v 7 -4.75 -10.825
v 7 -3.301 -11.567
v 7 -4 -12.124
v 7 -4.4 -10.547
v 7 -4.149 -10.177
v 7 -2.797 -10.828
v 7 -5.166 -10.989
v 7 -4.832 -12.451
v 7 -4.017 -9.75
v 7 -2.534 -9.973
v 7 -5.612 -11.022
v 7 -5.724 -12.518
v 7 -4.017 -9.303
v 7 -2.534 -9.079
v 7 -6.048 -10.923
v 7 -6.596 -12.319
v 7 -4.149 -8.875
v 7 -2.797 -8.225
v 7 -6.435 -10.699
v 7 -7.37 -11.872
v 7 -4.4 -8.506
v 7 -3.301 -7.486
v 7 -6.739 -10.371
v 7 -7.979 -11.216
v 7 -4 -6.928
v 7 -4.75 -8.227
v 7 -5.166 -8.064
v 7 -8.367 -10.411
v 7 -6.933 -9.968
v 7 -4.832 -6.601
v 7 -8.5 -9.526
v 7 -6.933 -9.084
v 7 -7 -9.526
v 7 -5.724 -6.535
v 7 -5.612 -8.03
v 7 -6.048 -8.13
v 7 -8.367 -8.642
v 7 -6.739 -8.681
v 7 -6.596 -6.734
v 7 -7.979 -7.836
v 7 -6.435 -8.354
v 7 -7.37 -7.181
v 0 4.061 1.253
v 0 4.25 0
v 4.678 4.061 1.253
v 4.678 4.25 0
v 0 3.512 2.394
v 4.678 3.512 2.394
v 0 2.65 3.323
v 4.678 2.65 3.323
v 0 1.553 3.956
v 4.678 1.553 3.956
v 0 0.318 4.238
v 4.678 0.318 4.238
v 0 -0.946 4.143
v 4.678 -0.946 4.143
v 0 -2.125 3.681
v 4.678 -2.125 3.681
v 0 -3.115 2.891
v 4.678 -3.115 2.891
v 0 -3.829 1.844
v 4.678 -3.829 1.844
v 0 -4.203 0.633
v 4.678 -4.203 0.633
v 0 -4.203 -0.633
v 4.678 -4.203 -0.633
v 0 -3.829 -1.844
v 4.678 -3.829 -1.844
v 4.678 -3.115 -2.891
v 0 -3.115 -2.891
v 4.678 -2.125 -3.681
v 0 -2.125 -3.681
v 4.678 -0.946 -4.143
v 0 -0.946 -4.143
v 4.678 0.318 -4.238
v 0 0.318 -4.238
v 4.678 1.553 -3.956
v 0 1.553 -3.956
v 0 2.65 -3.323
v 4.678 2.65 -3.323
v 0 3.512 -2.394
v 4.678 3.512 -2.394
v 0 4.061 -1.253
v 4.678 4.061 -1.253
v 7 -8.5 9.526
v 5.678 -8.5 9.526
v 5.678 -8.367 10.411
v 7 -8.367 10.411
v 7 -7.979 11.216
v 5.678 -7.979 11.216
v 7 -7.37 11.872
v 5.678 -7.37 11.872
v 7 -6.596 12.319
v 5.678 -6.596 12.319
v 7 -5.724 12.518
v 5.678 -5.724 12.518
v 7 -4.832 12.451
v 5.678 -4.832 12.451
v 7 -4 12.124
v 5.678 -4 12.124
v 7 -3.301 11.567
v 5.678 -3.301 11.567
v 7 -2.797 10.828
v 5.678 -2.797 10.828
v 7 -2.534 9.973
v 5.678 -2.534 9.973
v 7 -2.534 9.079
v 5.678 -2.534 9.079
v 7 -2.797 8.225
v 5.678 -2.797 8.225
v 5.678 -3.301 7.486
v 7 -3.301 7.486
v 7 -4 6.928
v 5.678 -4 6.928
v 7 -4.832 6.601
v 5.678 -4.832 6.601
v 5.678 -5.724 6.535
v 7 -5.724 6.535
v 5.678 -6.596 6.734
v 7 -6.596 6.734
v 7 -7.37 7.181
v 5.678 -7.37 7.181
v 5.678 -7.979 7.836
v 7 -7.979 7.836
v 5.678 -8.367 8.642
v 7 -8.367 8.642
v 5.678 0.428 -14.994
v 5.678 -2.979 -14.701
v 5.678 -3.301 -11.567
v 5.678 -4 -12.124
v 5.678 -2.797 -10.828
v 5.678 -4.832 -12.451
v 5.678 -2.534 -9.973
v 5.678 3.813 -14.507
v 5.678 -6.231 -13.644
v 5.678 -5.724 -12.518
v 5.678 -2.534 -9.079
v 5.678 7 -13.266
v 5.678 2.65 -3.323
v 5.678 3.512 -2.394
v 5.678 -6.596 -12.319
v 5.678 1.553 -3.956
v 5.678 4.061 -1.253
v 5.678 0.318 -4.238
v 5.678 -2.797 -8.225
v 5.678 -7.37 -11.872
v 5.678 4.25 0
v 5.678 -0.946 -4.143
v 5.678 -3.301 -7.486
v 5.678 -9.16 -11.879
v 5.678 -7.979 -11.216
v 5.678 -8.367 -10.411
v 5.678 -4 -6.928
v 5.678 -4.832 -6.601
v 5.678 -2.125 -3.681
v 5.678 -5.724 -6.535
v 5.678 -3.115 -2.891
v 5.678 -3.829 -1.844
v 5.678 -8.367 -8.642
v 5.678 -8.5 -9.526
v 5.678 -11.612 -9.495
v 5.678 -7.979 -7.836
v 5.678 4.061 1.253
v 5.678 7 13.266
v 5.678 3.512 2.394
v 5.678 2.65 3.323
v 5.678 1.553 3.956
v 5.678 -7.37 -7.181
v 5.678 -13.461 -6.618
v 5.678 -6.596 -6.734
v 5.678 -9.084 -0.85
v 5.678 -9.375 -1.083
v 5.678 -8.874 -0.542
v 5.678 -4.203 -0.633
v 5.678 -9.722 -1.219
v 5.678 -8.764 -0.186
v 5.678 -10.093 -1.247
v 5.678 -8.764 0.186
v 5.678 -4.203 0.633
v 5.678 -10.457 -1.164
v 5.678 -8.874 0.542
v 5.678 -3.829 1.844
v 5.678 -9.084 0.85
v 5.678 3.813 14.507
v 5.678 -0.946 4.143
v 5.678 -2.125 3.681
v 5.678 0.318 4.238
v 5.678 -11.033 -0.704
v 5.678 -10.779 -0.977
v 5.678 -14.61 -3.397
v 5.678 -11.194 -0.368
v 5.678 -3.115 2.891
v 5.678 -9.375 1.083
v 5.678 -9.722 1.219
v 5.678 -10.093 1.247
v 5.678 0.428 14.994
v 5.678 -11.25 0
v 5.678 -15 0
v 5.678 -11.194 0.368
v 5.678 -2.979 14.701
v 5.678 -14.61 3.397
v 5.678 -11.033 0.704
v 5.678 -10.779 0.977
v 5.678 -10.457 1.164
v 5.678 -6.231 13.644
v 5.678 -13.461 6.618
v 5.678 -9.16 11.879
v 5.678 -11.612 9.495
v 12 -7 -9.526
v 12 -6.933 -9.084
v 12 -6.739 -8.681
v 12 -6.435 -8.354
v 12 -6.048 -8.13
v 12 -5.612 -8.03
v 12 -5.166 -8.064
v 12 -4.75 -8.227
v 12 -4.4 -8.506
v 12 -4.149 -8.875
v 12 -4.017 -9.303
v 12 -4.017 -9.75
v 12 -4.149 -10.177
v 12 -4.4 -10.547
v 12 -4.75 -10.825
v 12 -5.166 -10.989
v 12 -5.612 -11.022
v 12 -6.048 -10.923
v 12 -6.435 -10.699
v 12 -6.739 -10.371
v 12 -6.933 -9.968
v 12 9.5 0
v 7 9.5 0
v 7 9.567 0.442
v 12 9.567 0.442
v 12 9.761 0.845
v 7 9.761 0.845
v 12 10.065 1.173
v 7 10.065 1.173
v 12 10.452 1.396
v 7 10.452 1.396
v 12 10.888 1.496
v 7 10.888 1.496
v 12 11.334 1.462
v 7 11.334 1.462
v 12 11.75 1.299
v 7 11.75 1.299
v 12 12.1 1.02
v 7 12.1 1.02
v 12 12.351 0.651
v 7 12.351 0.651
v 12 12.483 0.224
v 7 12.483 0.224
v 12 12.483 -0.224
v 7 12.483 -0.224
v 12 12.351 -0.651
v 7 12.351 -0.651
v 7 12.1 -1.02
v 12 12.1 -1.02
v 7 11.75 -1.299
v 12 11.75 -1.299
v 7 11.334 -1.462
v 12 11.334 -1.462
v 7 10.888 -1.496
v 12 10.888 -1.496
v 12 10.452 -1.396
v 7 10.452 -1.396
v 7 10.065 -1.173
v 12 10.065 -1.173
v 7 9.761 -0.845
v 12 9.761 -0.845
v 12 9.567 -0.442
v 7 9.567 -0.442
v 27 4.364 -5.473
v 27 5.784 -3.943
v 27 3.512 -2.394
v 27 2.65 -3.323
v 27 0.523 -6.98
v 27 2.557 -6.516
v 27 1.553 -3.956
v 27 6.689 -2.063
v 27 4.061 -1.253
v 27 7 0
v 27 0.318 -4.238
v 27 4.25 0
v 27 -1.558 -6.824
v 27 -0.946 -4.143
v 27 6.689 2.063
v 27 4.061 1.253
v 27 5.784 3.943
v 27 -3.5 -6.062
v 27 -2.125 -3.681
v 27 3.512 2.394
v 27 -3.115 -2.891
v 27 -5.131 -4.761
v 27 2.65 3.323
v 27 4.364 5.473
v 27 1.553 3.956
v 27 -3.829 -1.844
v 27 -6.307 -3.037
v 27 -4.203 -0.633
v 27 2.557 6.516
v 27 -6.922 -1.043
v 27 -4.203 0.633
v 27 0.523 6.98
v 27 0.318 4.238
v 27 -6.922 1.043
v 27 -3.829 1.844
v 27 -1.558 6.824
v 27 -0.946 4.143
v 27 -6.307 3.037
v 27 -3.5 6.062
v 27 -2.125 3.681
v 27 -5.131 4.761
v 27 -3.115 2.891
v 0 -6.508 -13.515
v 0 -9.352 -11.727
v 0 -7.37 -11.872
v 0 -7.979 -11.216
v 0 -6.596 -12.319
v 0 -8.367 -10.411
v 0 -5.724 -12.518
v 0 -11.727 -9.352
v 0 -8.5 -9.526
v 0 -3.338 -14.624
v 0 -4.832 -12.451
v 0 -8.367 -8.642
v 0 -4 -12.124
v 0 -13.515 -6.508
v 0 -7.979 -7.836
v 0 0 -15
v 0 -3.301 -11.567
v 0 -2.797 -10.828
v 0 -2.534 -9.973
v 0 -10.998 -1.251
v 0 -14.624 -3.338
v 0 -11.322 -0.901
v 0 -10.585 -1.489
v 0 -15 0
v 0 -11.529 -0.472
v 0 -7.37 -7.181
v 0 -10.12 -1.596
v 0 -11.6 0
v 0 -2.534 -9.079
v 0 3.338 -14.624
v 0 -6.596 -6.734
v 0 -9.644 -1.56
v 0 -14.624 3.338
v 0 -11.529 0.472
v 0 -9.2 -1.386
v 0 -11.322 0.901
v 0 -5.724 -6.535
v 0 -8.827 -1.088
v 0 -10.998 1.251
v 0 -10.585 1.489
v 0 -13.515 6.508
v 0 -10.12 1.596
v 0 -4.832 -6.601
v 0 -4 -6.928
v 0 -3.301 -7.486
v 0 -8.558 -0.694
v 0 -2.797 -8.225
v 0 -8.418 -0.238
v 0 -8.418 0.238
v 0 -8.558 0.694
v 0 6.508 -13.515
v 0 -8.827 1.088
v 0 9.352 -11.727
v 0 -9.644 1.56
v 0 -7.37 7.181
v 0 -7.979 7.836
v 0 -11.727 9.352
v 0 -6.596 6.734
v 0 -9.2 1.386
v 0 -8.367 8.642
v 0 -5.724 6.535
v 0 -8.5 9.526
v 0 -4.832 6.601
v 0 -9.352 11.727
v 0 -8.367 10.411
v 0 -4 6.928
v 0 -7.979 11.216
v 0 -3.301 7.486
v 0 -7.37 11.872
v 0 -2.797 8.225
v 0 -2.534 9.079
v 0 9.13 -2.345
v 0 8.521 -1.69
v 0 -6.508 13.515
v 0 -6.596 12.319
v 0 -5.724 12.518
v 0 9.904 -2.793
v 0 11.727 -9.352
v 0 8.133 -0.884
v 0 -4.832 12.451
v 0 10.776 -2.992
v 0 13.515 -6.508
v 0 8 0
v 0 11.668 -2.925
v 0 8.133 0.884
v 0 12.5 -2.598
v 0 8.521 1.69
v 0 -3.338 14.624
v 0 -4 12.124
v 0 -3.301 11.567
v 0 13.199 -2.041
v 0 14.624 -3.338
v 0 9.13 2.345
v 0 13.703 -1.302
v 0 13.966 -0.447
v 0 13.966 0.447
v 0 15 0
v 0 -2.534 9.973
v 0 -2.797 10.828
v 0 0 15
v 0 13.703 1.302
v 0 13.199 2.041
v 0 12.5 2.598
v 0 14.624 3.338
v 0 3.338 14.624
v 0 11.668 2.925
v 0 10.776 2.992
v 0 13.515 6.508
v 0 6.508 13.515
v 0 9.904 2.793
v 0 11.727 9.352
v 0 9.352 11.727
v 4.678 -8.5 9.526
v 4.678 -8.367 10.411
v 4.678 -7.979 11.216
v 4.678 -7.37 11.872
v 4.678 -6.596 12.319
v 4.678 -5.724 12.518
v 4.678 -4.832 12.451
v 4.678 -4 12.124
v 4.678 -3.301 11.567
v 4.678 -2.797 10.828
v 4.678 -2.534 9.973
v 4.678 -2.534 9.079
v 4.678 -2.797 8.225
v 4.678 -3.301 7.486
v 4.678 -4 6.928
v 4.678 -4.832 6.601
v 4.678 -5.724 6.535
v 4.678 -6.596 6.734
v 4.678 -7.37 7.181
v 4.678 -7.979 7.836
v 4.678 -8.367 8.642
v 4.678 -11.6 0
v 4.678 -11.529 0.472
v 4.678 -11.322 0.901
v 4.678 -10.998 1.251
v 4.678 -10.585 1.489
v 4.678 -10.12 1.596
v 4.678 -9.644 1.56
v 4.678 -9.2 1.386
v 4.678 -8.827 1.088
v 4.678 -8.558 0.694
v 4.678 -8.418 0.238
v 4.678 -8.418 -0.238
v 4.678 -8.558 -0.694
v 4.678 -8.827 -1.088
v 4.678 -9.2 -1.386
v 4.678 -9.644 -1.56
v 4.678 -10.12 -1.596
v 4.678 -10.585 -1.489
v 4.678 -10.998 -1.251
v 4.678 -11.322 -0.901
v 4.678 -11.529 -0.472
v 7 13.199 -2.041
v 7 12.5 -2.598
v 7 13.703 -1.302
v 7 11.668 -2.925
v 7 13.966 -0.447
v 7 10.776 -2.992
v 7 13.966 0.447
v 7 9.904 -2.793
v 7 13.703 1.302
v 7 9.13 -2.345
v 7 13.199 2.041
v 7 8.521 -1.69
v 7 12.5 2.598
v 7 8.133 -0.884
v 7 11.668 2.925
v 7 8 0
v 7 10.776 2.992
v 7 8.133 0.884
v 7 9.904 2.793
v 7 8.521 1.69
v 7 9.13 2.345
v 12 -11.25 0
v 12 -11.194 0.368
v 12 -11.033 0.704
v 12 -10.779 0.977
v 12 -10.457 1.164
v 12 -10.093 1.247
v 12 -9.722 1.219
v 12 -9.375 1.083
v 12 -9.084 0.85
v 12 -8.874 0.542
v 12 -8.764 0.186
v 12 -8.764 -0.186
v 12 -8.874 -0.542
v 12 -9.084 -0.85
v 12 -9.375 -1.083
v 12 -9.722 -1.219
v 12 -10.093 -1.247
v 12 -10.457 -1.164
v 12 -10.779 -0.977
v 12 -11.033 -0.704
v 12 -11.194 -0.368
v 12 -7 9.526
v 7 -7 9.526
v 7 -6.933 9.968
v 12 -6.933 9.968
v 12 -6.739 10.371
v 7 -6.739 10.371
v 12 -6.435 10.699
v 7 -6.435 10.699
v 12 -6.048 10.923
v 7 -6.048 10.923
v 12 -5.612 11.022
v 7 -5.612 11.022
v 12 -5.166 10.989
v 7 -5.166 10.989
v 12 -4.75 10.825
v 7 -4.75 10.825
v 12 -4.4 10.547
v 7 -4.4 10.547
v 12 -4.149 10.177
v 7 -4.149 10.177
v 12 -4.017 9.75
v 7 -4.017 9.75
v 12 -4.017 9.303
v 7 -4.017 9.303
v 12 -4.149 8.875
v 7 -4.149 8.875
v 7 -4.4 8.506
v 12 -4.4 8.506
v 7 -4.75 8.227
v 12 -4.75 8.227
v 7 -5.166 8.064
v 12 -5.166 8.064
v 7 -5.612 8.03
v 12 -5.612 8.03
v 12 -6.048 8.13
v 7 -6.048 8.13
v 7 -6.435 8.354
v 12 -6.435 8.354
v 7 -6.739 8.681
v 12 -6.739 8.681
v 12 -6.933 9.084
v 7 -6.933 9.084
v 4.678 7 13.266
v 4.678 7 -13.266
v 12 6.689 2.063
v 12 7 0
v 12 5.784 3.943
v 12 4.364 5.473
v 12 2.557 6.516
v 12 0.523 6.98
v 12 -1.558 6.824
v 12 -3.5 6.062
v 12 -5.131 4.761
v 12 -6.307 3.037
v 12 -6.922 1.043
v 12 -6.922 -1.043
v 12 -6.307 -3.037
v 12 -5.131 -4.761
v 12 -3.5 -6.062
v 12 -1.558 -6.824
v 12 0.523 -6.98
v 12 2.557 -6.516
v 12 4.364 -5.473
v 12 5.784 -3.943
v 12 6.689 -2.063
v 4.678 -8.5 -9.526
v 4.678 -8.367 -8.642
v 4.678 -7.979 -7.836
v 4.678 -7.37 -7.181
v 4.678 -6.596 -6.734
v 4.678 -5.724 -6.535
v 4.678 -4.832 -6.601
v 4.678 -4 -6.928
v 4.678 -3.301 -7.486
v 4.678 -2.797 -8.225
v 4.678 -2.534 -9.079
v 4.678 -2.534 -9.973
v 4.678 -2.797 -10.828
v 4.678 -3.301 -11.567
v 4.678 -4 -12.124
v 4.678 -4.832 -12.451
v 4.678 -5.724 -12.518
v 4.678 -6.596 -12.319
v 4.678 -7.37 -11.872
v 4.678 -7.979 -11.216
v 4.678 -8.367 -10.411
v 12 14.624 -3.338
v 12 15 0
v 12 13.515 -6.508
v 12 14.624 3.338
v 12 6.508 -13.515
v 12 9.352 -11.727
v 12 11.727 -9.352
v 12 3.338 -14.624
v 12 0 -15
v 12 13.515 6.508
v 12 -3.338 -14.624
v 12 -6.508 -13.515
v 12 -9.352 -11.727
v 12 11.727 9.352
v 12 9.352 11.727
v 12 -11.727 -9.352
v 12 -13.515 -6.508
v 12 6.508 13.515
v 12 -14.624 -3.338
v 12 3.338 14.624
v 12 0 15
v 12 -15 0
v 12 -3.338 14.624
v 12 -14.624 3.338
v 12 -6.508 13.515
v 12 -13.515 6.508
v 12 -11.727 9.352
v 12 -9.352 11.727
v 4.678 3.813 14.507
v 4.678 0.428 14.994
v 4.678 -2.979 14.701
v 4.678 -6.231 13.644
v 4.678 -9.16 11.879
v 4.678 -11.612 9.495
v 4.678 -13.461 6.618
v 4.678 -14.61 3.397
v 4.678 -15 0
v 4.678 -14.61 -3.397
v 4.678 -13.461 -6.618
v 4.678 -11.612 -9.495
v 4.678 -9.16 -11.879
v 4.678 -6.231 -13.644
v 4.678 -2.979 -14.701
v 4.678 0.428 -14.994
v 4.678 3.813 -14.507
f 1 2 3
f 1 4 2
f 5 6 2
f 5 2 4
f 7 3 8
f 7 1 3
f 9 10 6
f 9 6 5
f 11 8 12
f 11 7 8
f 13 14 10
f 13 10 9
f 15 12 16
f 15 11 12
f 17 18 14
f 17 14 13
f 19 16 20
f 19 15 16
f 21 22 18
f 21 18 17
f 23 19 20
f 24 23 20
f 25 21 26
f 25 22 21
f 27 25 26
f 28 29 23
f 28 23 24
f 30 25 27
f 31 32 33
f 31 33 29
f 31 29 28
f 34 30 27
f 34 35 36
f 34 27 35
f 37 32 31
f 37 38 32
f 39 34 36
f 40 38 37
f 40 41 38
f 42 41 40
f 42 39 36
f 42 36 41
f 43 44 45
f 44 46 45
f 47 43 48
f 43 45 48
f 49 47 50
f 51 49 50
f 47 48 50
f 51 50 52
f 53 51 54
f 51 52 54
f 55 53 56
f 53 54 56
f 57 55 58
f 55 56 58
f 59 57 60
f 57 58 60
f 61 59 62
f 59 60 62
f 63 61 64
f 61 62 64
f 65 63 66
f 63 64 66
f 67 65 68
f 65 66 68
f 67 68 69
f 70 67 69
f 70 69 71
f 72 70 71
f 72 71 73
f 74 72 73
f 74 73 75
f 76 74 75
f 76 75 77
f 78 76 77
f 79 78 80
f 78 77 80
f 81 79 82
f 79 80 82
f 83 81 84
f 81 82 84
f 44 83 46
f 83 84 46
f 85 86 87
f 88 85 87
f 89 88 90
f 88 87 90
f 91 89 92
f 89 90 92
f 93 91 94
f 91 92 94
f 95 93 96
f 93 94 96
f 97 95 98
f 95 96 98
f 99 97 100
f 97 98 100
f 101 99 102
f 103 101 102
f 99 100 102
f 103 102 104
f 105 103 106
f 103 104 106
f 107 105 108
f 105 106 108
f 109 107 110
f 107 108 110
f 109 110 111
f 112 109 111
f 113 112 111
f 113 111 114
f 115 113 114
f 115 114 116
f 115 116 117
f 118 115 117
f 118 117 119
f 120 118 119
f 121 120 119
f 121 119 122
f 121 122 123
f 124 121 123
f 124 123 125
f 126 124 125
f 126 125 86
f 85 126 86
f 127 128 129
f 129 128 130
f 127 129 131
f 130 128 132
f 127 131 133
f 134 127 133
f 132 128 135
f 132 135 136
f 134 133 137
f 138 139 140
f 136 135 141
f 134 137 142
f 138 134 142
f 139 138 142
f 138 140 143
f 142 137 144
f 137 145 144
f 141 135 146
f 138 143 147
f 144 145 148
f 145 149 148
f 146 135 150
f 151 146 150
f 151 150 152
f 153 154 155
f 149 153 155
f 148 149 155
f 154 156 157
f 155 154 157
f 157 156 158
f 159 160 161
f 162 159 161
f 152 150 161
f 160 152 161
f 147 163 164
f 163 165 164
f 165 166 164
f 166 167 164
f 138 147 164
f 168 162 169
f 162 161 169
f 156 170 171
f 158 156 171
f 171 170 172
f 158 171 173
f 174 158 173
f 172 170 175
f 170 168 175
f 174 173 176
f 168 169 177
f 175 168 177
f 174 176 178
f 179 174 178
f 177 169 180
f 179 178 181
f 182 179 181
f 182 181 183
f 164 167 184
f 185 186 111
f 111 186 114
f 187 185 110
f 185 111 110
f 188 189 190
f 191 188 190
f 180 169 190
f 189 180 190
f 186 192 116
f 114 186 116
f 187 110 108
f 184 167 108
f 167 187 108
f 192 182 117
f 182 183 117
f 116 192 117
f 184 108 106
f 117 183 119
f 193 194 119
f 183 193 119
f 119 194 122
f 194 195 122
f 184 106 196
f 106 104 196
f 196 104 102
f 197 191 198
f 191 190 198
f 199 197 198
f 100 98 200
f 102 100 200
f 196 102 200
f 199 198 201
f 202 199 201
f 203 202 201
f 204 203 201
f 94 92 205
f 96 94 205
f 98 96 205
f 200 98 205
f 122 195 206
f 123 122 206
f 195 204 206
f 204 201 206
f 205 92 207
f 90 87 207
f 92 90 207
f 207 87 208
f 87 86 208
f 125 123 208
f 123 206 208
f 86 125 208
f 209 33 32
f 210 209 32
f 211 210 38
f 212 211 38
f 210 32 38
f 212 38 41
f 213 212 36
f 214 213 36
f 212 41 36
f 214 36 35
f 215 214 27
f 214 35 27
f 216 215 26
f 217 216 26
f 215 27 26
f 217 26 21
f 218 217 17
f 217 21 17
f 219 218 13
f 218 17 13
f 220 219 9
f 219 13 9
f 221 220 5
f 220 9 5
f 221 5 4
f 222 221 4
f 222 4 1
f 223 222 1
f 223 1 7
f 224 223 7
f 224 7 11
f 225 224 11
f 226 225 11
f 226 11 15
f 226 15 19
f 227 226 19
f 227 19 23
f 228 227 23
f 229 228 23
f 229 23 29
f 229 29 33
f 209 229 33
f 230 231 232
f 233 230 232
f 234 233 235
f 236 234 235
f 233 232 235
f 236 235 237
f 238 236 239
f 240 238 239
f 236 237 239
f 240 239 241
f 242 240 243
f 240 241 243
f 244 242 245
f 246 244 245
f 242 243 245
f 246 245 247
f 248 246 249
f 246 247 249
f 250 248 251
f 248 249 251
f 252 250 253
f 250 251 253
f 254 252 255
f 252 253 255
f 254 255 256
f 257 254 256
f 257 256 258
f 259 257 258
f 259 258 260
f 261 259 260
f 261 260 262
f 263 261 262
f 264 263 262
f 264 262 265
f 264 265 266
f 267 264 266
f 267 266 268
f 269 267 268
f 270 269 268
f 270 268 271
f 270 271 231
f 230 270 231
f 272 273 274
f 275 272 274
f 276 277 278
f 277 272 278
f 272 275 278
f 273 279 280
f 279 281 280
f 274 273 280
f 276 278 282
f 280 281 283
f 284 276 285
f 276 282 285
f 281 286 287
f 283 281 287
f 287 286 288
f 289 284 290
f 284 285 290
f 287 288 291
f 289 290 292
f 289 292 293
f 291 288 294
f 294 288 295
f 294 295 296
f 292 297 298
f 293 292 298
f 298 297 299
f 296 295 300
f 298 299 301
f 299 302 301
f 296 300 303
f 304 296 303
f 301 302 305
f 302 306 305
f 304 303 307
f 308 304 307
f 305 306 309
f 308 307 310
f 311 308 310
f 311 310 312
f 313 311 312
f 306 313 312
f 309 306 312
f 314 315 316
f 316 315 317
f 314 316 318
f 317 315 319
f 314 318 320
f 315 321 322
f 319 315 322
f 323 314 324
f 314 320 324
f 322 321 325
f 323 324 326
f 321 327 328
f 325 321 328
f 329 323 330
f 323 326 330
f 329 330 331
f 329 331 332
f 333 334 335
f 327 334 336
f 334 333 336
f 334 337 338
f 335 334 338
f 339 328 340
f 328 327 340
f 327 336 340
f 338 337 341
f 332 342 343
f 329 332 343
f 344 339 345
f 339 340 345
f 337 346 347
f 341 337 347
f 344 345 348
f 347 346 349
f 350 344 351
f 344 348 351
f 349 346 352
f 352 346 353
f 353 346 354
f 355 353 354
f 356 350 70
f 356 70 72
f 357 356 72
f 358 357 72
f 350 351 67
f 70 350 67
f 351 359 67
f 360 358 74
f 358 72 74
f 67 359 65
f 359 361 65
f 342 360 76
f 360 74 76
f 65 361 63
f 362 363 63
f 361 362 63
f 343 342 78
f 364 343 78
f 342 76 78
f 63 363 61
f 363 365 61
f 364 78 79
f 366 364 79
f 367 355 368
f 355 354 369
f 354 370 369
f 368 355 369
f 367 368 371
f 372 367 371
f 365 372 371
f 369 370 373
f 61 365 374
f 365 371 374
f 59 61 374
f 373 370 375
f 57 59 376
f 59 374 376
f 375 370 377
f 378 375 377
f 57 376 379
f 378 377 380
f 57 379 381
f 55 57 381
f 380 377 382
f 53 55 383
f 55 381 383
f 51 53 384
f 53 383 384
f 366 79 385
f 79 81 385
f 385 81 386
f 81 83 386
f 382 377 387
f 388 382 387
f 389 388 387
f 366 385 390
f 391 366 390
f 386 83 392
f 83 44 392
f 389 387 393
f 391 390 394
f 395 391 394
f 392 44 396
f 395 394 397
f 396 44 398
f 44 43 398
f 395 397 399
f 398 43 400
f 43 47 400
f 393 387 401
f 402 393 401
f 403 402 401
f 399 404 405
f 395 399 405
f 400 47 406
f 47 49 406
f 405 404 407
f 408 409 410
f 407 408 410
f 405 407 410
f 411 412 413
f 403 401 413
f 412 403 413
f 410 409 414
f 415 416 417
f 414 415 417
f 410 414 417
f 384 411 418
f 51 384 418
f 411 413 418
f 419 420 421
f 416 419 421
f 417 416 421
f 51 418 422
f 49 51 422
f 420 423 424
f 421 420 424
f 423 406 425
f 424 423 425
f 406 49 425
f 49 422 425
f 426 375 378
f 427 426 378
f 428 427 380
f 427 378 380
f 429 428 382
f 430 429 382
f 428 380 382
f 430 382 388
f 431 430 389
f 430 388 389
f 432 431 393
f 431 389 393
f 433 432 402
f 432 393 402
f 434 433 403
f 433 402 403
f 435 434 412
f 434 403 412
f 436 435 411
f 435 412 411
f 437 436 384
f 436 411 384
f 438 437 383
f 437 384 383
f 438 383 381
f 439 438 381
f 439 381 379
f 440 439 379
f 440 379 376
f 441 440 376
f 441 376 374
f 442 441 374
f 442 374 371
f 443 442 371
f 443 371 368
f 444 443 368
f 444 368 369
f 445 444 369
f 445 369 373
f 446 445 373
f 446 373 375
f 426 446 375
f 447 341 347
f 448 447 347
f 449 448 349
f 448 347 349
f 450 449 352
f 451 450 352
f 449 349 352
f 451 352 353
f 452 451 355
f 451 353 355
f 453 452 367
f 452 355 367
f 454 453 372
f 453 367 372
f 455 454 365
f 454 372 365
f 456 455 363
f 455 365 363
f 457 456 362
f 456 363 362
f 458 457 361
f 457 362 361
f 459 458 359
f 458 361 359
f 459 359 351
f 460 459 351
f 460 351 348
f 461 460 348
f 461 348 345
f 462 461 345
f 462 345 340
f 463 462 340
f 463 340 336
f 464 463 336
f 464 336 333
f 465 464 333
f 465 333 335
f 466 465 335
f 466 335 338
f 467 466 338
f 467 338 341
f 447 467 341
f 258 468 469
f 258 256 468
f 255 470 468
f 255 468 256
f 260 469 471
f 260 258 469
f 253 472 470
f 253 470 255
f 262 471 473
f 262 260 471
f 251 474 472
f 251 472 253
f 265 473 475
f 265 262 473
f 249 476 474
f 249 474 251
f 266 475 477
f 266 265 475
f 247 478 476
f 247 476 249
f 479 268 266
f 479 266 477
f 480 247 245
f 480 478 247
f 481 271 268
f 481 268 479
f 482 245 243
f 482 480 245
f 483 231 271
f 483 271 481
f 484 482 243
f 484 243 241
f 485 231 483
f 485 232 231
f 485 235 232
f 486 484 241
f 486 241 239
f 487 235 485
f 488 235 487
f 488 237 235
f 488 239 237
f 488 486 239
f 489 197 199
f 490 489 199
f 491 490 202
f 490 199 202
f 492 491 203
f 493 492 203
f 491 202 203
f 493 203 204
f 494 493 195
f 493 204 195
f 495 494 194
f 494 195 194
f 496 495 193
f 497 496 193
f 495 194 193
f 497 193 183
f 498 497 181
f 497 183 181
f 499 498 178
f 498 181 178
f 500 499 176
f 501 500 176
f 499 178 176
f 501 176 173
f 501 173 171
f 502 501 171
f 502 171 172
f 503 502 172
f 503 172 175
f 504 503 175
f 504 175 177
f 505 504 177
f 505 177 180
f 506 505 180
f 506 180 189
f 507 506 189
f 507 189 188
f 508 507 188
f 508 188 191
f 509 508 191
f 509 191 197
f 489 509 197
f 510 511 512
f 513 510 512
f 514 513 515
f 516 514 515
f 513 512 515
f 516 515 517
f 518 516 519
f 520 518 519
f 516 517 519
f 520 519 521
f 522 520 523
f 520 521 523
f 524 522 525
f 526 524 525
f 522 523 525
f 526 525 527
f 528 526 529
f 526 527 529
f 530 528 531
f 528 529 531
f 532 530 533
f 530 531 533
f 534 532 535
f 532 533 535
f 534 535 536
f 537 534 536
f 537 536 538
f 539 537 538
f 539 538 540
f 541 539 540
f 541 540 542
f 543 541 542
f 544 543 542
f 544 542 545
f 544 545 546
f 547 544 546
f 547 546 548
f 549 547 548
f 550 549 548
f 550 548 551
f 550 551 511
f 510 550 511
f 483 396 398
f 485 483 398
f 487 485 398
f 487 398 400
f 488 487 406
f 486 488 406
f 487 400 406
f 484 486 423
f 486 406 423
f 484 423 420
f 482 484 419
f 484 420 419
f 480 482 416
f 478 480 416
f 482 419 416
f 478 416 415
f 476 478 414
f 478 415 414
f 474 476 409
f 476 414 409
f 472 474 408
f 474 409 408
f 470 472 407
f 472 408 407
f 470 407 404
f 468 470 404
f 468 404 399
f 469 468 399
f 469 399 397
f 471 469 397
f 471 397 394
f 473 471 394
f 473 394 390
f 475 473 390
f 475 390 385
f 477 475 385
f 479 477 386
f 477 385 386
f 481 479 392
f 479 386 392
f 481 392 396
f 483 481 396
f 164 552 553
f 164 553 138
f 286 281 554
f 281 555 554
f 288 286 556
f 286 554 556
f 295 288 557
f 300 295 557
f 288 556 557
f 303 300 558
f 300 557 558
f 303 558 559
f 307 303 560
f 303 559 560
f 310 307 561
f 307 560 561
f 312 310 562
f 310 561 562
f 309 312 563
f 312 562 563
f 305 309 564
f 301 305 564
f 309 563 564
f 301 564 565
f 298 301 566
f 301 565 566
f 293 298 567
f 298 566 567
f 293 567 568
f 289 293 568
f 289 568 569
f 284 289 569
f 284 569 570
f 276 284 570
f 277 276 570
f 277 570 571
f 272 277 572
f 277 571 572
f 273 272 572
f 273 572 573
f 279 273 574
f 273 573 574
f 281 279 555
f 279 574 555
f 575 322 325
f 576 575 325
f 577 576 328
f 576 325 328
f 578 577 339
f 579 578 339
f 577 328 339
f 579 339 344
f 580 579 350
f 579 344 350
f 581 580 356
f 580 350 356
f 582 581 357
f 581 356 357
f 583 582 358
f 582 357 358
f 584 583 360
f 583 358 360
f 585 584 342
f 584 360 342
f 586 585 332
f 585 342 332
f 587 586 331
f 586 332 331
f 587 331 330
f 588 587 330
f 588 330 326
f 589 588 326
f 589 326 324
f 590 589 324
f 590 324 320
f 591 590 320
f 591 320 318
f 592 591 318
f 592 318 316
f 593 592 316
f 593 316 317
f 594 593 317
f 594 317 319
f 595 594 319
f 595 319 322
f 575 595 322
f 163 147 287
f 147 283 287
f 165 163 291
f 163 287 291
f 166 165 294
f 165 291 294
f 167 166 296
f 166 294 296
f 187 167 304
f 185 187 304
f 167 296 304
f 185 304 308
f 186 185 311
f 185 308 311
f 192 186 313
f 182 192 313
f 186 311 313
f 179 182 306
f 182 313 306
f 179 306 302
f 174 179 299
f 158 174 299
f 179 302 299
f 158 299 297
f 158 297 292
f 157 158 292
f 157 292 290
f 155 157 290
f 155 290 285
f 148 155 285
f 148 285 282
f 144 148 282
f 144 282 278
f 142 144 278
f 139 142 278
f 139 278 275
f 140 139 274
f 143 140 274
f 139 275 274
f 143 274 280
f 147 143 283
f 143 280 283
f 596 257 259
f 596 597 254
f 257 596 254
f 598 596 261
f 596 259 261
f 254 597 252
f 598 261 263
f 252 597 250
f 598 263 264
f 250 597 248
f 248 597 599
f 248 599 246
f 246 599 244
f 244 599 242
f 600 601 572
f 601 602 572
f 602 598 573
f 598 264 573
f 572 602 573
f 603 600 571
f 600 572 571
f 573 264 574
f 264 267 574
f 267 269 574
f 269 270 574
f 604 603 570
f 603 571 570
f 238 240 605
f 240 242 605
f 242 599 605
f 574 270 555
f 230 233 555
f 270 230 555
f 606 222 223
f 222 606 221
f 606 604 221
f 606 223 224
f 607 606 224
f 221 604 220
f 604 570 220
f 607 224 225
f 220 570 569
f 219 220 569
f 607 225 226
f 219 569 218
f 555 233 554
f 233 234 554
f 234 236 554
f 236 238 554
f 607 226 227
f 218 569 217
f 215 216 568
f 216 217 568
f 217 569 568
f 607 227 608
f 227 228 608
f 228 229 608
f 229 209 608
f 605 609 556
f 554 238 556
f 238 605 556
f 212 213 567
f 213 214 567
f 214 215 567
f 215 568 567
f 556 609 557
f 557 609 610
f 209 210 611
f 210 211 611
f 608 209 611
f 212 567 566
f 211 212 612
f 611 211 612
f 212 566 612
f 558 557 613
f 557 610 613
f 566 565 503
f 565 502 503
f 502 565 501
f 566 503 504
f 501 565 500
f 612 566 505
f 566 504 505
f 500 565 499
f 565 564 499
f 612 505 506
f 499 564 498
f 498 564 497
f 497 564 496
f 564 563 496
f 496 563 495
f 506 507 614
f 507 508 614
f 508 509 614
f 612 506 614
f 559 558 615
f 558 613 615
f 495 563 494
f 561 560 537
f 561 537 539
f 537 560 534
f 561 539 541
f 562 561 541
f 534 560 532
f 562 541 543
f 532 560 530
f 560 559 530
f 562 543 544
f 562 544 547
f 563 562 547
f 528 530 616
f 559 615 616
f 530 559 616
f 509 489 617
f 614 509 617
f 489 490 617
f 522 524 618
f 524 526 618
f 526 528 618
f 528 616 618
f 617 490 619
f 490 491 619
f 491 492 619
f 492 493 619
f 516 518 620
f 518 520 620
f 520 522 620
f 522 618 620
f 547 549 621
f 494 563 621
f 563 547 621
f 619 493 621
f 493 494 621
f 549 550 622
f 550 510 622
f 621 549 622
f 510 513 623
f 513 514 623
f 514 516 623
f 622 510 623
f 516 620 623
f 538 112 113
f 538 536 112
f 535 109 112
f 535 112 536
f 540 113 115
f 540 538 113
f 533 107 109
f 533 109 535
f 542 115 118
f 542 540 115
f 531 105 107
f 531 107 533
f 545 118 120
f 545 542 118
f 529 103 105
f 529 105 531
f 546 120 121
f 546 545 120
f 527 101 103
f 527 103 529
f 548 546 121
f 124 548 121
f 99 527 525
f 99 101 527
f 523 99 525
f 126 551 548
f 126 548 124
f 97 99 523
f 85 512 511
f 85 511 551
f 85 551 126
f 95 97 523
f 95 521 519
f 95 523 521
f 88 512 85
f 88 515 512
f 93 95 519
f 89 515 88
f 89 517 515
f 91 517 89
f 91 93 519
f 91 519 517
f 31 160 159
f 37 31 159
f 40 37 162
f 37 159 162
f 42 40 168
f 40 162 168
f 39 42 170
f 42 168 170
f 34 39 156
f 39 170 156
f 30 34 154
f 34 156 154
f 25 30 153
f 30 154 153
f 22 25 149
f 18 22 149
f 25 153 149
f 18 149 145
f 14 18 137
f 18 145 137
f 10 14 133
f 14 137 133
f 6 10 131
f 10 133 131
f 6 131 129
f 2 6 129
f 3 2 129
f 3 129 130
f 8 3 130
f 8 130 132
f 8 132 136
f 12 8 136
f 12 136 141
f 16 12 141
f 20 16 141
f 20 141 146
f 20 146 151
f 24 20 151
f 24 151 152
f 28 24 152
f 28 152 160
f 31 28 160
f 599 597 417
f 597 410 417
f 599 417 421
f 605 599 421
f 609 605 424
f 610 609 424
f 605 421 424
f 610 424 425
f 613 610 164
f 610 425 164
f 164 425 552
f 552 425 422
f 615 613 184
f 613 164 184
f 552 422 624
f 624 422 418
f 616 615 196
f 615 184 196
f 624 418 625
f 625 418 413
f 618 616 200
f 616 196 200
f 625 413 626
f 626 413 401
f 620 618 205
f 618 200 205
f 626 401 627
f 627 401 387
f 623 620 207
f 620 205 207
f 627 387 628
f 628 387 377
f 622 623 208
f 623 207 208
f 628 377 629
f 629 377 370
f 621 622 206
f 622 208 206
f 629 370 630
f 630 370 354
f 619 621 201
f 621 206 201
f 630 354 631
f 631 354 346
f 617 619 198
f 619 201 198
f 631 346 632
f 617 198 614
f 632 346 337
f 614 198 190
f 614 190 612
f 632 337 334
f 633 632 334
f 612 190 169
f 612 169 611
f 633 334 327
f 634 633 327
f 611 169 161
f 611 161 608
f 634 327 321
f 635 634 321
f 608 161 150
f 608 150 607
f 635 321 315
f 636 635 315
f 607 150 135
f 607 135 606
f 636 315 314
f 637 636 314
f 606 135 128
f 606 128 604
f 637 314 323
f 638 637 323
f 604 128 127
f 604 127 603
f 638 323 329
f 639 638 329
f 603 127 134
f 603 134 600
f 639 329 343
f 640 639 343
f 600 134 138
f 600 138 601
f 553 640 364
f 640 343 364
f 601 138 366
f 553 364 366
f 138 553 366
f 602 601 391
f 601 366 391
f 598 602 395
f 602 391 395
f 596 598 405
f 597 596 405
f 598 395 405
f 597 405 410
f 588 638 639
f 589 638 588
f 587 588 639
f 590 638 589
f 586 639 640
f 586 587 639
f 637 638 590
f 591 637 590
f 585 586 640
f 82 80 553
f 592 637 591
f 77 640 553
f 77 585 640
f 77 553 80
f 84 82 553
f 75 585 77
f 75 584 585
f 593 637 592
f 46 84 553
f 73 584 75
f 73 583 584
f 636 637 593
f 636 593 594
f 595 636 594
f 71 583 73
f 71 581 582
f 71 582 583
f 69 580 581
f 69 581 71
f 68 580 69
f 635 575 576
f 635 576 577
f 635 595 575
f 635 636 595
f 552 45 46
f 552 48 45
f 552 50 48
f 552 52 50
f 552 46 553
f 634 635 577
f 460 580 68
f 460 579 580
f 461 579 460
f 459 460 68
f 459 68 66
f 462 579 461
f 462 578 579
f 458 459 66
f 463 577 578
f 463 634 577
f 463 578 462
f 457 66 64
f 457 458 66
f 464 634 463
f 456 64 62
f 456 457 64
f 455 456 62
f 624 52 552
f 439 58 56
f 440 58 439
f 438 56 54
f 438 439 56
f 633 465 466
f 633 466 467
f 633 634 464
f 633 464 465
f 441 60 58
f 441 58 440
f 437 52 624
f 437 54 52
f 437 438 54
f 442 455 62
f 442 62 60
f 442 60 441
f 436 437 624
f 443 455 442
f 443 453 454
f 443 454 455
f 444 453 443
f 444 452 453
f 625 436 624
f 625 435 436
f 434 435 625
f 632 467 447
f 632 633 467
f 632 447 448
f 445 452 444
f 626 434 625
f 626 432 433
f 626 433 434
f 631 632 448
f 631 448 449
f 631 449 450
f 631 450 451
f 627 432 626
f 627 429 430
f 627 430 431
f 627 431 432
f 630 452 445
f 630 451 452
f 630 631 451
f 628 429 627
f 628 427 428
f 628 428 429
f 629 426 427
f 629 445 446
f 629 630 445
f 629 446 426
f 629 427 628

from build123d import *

# Parameters (mm, degrees)
F2_R          = 1.5
F3_DEPTH      = 27.001
F4_R          = 3
F4_R_2        = 1.5
F5_DEPTH      = 7
F6_W          = 1
F6_H          = 45
F7_DEPTH      = 7
F7_DEPTH_BACK = 25
F8_R          = 1.25
F9_DEPTH      = 27.001
F10_R         = 1.6
F10_R_2       = 1.25
F11_DEPTH     = 5


with BuildPart() as f1:
    # F0 (on Top) → F1 (revolve)
    with BuildSketch(Plane.XY):
        Polygon((0, 15), (0, 4.25), (27, 4.25), (27, 7), (12, 7), (12, 15), align=None)
    revolve(axis=Axis((49.570793286, 0, 0), (1, 0, 0)))

    # F2 (on face) → F3 (cut, through all)
    with BuildSketch(Plane(origin=(0, 0, 0), x_dir=(0, -1, 0), z_dir=(-1, 0, 0))):
        with Locations((5.5, 9.5262794416)):
            Circle(F2_R)
        with Locations((-11, 0)):
            Circle(F2_R)
        with Locations((5.5, -9.5262794416)):
            Circle(F2_R)
    extrude(amount=-F3_DEPTH, mode=Mode.SUBTRACT)

    # F4 (on face) → F5 (cut)
    with BuildSketch(Plane(origin=(0, 0, 0), x_dir=(0, -1, 0), z_dir=(-1, 0, 0))):
        with Locations((5.5, 9.5262794416)):
            Circle(F4_R)
        with Locations((5.5, 9.5262794416)):
            Circle(F4_R_2, mode=Mode.SUBTRACT)
        with Locations((-11, 0)):
            Circle(F4_R)
        with Locations((-11, 0)):
            Circle(F4_R_2, mode=Mode.SUBTRACT)
        with Locations((5.5, -9.5262794416)):
            Circle(F4_R)
        with Locations((5.5, -9.5262794416)):
            Circle(F4_R_2, mode=Mode.SUBTRACT)
    extrude(amount=-F5_DEPTH, mode=Mode.SUBTRACT)

    # F6 (on Front) → F7 (cut, two sides)
    with BuildSketch(Plane.XZ) as f7_sk:
        with Locations((5.1783517702, 0)):
            Rectangle(F6_W, F6_H)
    extrude(amount=-F7_DEPTH, mode=Mode.SUBTRACT)
    extrude(f7_sk.sketch, amount=F7_DEPTH_BACK, mode=Mode.SUBTRACT)

    # F8 (on face) → F9 (cut, through all)
    with BuildSketch(Plane(origin=(0, 0, 0), x_dir=(0, -1, 0), z_dir=(-1, 0, 0))):
        with Locations((10, 0)):
            Circle(F8_R)
    extrude(amount=-F9_DEPTH, mode=Mode.SUBTRACT)

    # F10 (on face) → F11 (cut)
    with BuildSketch(Plane(origin=(0, 0, 0), x_dir=(0, -1, 0), z_dir=(-1, 0, 0))):
        with Locations((10, 0)):
            Circle(F10_R)
        with Locations((10, 0)):
            Circle(F10_R_2, mode=Mode.SUBTRACT)
    extrude(amount=-F11_DEPTH, mode=Mode.SUBTRACT)


solid = f1.part
